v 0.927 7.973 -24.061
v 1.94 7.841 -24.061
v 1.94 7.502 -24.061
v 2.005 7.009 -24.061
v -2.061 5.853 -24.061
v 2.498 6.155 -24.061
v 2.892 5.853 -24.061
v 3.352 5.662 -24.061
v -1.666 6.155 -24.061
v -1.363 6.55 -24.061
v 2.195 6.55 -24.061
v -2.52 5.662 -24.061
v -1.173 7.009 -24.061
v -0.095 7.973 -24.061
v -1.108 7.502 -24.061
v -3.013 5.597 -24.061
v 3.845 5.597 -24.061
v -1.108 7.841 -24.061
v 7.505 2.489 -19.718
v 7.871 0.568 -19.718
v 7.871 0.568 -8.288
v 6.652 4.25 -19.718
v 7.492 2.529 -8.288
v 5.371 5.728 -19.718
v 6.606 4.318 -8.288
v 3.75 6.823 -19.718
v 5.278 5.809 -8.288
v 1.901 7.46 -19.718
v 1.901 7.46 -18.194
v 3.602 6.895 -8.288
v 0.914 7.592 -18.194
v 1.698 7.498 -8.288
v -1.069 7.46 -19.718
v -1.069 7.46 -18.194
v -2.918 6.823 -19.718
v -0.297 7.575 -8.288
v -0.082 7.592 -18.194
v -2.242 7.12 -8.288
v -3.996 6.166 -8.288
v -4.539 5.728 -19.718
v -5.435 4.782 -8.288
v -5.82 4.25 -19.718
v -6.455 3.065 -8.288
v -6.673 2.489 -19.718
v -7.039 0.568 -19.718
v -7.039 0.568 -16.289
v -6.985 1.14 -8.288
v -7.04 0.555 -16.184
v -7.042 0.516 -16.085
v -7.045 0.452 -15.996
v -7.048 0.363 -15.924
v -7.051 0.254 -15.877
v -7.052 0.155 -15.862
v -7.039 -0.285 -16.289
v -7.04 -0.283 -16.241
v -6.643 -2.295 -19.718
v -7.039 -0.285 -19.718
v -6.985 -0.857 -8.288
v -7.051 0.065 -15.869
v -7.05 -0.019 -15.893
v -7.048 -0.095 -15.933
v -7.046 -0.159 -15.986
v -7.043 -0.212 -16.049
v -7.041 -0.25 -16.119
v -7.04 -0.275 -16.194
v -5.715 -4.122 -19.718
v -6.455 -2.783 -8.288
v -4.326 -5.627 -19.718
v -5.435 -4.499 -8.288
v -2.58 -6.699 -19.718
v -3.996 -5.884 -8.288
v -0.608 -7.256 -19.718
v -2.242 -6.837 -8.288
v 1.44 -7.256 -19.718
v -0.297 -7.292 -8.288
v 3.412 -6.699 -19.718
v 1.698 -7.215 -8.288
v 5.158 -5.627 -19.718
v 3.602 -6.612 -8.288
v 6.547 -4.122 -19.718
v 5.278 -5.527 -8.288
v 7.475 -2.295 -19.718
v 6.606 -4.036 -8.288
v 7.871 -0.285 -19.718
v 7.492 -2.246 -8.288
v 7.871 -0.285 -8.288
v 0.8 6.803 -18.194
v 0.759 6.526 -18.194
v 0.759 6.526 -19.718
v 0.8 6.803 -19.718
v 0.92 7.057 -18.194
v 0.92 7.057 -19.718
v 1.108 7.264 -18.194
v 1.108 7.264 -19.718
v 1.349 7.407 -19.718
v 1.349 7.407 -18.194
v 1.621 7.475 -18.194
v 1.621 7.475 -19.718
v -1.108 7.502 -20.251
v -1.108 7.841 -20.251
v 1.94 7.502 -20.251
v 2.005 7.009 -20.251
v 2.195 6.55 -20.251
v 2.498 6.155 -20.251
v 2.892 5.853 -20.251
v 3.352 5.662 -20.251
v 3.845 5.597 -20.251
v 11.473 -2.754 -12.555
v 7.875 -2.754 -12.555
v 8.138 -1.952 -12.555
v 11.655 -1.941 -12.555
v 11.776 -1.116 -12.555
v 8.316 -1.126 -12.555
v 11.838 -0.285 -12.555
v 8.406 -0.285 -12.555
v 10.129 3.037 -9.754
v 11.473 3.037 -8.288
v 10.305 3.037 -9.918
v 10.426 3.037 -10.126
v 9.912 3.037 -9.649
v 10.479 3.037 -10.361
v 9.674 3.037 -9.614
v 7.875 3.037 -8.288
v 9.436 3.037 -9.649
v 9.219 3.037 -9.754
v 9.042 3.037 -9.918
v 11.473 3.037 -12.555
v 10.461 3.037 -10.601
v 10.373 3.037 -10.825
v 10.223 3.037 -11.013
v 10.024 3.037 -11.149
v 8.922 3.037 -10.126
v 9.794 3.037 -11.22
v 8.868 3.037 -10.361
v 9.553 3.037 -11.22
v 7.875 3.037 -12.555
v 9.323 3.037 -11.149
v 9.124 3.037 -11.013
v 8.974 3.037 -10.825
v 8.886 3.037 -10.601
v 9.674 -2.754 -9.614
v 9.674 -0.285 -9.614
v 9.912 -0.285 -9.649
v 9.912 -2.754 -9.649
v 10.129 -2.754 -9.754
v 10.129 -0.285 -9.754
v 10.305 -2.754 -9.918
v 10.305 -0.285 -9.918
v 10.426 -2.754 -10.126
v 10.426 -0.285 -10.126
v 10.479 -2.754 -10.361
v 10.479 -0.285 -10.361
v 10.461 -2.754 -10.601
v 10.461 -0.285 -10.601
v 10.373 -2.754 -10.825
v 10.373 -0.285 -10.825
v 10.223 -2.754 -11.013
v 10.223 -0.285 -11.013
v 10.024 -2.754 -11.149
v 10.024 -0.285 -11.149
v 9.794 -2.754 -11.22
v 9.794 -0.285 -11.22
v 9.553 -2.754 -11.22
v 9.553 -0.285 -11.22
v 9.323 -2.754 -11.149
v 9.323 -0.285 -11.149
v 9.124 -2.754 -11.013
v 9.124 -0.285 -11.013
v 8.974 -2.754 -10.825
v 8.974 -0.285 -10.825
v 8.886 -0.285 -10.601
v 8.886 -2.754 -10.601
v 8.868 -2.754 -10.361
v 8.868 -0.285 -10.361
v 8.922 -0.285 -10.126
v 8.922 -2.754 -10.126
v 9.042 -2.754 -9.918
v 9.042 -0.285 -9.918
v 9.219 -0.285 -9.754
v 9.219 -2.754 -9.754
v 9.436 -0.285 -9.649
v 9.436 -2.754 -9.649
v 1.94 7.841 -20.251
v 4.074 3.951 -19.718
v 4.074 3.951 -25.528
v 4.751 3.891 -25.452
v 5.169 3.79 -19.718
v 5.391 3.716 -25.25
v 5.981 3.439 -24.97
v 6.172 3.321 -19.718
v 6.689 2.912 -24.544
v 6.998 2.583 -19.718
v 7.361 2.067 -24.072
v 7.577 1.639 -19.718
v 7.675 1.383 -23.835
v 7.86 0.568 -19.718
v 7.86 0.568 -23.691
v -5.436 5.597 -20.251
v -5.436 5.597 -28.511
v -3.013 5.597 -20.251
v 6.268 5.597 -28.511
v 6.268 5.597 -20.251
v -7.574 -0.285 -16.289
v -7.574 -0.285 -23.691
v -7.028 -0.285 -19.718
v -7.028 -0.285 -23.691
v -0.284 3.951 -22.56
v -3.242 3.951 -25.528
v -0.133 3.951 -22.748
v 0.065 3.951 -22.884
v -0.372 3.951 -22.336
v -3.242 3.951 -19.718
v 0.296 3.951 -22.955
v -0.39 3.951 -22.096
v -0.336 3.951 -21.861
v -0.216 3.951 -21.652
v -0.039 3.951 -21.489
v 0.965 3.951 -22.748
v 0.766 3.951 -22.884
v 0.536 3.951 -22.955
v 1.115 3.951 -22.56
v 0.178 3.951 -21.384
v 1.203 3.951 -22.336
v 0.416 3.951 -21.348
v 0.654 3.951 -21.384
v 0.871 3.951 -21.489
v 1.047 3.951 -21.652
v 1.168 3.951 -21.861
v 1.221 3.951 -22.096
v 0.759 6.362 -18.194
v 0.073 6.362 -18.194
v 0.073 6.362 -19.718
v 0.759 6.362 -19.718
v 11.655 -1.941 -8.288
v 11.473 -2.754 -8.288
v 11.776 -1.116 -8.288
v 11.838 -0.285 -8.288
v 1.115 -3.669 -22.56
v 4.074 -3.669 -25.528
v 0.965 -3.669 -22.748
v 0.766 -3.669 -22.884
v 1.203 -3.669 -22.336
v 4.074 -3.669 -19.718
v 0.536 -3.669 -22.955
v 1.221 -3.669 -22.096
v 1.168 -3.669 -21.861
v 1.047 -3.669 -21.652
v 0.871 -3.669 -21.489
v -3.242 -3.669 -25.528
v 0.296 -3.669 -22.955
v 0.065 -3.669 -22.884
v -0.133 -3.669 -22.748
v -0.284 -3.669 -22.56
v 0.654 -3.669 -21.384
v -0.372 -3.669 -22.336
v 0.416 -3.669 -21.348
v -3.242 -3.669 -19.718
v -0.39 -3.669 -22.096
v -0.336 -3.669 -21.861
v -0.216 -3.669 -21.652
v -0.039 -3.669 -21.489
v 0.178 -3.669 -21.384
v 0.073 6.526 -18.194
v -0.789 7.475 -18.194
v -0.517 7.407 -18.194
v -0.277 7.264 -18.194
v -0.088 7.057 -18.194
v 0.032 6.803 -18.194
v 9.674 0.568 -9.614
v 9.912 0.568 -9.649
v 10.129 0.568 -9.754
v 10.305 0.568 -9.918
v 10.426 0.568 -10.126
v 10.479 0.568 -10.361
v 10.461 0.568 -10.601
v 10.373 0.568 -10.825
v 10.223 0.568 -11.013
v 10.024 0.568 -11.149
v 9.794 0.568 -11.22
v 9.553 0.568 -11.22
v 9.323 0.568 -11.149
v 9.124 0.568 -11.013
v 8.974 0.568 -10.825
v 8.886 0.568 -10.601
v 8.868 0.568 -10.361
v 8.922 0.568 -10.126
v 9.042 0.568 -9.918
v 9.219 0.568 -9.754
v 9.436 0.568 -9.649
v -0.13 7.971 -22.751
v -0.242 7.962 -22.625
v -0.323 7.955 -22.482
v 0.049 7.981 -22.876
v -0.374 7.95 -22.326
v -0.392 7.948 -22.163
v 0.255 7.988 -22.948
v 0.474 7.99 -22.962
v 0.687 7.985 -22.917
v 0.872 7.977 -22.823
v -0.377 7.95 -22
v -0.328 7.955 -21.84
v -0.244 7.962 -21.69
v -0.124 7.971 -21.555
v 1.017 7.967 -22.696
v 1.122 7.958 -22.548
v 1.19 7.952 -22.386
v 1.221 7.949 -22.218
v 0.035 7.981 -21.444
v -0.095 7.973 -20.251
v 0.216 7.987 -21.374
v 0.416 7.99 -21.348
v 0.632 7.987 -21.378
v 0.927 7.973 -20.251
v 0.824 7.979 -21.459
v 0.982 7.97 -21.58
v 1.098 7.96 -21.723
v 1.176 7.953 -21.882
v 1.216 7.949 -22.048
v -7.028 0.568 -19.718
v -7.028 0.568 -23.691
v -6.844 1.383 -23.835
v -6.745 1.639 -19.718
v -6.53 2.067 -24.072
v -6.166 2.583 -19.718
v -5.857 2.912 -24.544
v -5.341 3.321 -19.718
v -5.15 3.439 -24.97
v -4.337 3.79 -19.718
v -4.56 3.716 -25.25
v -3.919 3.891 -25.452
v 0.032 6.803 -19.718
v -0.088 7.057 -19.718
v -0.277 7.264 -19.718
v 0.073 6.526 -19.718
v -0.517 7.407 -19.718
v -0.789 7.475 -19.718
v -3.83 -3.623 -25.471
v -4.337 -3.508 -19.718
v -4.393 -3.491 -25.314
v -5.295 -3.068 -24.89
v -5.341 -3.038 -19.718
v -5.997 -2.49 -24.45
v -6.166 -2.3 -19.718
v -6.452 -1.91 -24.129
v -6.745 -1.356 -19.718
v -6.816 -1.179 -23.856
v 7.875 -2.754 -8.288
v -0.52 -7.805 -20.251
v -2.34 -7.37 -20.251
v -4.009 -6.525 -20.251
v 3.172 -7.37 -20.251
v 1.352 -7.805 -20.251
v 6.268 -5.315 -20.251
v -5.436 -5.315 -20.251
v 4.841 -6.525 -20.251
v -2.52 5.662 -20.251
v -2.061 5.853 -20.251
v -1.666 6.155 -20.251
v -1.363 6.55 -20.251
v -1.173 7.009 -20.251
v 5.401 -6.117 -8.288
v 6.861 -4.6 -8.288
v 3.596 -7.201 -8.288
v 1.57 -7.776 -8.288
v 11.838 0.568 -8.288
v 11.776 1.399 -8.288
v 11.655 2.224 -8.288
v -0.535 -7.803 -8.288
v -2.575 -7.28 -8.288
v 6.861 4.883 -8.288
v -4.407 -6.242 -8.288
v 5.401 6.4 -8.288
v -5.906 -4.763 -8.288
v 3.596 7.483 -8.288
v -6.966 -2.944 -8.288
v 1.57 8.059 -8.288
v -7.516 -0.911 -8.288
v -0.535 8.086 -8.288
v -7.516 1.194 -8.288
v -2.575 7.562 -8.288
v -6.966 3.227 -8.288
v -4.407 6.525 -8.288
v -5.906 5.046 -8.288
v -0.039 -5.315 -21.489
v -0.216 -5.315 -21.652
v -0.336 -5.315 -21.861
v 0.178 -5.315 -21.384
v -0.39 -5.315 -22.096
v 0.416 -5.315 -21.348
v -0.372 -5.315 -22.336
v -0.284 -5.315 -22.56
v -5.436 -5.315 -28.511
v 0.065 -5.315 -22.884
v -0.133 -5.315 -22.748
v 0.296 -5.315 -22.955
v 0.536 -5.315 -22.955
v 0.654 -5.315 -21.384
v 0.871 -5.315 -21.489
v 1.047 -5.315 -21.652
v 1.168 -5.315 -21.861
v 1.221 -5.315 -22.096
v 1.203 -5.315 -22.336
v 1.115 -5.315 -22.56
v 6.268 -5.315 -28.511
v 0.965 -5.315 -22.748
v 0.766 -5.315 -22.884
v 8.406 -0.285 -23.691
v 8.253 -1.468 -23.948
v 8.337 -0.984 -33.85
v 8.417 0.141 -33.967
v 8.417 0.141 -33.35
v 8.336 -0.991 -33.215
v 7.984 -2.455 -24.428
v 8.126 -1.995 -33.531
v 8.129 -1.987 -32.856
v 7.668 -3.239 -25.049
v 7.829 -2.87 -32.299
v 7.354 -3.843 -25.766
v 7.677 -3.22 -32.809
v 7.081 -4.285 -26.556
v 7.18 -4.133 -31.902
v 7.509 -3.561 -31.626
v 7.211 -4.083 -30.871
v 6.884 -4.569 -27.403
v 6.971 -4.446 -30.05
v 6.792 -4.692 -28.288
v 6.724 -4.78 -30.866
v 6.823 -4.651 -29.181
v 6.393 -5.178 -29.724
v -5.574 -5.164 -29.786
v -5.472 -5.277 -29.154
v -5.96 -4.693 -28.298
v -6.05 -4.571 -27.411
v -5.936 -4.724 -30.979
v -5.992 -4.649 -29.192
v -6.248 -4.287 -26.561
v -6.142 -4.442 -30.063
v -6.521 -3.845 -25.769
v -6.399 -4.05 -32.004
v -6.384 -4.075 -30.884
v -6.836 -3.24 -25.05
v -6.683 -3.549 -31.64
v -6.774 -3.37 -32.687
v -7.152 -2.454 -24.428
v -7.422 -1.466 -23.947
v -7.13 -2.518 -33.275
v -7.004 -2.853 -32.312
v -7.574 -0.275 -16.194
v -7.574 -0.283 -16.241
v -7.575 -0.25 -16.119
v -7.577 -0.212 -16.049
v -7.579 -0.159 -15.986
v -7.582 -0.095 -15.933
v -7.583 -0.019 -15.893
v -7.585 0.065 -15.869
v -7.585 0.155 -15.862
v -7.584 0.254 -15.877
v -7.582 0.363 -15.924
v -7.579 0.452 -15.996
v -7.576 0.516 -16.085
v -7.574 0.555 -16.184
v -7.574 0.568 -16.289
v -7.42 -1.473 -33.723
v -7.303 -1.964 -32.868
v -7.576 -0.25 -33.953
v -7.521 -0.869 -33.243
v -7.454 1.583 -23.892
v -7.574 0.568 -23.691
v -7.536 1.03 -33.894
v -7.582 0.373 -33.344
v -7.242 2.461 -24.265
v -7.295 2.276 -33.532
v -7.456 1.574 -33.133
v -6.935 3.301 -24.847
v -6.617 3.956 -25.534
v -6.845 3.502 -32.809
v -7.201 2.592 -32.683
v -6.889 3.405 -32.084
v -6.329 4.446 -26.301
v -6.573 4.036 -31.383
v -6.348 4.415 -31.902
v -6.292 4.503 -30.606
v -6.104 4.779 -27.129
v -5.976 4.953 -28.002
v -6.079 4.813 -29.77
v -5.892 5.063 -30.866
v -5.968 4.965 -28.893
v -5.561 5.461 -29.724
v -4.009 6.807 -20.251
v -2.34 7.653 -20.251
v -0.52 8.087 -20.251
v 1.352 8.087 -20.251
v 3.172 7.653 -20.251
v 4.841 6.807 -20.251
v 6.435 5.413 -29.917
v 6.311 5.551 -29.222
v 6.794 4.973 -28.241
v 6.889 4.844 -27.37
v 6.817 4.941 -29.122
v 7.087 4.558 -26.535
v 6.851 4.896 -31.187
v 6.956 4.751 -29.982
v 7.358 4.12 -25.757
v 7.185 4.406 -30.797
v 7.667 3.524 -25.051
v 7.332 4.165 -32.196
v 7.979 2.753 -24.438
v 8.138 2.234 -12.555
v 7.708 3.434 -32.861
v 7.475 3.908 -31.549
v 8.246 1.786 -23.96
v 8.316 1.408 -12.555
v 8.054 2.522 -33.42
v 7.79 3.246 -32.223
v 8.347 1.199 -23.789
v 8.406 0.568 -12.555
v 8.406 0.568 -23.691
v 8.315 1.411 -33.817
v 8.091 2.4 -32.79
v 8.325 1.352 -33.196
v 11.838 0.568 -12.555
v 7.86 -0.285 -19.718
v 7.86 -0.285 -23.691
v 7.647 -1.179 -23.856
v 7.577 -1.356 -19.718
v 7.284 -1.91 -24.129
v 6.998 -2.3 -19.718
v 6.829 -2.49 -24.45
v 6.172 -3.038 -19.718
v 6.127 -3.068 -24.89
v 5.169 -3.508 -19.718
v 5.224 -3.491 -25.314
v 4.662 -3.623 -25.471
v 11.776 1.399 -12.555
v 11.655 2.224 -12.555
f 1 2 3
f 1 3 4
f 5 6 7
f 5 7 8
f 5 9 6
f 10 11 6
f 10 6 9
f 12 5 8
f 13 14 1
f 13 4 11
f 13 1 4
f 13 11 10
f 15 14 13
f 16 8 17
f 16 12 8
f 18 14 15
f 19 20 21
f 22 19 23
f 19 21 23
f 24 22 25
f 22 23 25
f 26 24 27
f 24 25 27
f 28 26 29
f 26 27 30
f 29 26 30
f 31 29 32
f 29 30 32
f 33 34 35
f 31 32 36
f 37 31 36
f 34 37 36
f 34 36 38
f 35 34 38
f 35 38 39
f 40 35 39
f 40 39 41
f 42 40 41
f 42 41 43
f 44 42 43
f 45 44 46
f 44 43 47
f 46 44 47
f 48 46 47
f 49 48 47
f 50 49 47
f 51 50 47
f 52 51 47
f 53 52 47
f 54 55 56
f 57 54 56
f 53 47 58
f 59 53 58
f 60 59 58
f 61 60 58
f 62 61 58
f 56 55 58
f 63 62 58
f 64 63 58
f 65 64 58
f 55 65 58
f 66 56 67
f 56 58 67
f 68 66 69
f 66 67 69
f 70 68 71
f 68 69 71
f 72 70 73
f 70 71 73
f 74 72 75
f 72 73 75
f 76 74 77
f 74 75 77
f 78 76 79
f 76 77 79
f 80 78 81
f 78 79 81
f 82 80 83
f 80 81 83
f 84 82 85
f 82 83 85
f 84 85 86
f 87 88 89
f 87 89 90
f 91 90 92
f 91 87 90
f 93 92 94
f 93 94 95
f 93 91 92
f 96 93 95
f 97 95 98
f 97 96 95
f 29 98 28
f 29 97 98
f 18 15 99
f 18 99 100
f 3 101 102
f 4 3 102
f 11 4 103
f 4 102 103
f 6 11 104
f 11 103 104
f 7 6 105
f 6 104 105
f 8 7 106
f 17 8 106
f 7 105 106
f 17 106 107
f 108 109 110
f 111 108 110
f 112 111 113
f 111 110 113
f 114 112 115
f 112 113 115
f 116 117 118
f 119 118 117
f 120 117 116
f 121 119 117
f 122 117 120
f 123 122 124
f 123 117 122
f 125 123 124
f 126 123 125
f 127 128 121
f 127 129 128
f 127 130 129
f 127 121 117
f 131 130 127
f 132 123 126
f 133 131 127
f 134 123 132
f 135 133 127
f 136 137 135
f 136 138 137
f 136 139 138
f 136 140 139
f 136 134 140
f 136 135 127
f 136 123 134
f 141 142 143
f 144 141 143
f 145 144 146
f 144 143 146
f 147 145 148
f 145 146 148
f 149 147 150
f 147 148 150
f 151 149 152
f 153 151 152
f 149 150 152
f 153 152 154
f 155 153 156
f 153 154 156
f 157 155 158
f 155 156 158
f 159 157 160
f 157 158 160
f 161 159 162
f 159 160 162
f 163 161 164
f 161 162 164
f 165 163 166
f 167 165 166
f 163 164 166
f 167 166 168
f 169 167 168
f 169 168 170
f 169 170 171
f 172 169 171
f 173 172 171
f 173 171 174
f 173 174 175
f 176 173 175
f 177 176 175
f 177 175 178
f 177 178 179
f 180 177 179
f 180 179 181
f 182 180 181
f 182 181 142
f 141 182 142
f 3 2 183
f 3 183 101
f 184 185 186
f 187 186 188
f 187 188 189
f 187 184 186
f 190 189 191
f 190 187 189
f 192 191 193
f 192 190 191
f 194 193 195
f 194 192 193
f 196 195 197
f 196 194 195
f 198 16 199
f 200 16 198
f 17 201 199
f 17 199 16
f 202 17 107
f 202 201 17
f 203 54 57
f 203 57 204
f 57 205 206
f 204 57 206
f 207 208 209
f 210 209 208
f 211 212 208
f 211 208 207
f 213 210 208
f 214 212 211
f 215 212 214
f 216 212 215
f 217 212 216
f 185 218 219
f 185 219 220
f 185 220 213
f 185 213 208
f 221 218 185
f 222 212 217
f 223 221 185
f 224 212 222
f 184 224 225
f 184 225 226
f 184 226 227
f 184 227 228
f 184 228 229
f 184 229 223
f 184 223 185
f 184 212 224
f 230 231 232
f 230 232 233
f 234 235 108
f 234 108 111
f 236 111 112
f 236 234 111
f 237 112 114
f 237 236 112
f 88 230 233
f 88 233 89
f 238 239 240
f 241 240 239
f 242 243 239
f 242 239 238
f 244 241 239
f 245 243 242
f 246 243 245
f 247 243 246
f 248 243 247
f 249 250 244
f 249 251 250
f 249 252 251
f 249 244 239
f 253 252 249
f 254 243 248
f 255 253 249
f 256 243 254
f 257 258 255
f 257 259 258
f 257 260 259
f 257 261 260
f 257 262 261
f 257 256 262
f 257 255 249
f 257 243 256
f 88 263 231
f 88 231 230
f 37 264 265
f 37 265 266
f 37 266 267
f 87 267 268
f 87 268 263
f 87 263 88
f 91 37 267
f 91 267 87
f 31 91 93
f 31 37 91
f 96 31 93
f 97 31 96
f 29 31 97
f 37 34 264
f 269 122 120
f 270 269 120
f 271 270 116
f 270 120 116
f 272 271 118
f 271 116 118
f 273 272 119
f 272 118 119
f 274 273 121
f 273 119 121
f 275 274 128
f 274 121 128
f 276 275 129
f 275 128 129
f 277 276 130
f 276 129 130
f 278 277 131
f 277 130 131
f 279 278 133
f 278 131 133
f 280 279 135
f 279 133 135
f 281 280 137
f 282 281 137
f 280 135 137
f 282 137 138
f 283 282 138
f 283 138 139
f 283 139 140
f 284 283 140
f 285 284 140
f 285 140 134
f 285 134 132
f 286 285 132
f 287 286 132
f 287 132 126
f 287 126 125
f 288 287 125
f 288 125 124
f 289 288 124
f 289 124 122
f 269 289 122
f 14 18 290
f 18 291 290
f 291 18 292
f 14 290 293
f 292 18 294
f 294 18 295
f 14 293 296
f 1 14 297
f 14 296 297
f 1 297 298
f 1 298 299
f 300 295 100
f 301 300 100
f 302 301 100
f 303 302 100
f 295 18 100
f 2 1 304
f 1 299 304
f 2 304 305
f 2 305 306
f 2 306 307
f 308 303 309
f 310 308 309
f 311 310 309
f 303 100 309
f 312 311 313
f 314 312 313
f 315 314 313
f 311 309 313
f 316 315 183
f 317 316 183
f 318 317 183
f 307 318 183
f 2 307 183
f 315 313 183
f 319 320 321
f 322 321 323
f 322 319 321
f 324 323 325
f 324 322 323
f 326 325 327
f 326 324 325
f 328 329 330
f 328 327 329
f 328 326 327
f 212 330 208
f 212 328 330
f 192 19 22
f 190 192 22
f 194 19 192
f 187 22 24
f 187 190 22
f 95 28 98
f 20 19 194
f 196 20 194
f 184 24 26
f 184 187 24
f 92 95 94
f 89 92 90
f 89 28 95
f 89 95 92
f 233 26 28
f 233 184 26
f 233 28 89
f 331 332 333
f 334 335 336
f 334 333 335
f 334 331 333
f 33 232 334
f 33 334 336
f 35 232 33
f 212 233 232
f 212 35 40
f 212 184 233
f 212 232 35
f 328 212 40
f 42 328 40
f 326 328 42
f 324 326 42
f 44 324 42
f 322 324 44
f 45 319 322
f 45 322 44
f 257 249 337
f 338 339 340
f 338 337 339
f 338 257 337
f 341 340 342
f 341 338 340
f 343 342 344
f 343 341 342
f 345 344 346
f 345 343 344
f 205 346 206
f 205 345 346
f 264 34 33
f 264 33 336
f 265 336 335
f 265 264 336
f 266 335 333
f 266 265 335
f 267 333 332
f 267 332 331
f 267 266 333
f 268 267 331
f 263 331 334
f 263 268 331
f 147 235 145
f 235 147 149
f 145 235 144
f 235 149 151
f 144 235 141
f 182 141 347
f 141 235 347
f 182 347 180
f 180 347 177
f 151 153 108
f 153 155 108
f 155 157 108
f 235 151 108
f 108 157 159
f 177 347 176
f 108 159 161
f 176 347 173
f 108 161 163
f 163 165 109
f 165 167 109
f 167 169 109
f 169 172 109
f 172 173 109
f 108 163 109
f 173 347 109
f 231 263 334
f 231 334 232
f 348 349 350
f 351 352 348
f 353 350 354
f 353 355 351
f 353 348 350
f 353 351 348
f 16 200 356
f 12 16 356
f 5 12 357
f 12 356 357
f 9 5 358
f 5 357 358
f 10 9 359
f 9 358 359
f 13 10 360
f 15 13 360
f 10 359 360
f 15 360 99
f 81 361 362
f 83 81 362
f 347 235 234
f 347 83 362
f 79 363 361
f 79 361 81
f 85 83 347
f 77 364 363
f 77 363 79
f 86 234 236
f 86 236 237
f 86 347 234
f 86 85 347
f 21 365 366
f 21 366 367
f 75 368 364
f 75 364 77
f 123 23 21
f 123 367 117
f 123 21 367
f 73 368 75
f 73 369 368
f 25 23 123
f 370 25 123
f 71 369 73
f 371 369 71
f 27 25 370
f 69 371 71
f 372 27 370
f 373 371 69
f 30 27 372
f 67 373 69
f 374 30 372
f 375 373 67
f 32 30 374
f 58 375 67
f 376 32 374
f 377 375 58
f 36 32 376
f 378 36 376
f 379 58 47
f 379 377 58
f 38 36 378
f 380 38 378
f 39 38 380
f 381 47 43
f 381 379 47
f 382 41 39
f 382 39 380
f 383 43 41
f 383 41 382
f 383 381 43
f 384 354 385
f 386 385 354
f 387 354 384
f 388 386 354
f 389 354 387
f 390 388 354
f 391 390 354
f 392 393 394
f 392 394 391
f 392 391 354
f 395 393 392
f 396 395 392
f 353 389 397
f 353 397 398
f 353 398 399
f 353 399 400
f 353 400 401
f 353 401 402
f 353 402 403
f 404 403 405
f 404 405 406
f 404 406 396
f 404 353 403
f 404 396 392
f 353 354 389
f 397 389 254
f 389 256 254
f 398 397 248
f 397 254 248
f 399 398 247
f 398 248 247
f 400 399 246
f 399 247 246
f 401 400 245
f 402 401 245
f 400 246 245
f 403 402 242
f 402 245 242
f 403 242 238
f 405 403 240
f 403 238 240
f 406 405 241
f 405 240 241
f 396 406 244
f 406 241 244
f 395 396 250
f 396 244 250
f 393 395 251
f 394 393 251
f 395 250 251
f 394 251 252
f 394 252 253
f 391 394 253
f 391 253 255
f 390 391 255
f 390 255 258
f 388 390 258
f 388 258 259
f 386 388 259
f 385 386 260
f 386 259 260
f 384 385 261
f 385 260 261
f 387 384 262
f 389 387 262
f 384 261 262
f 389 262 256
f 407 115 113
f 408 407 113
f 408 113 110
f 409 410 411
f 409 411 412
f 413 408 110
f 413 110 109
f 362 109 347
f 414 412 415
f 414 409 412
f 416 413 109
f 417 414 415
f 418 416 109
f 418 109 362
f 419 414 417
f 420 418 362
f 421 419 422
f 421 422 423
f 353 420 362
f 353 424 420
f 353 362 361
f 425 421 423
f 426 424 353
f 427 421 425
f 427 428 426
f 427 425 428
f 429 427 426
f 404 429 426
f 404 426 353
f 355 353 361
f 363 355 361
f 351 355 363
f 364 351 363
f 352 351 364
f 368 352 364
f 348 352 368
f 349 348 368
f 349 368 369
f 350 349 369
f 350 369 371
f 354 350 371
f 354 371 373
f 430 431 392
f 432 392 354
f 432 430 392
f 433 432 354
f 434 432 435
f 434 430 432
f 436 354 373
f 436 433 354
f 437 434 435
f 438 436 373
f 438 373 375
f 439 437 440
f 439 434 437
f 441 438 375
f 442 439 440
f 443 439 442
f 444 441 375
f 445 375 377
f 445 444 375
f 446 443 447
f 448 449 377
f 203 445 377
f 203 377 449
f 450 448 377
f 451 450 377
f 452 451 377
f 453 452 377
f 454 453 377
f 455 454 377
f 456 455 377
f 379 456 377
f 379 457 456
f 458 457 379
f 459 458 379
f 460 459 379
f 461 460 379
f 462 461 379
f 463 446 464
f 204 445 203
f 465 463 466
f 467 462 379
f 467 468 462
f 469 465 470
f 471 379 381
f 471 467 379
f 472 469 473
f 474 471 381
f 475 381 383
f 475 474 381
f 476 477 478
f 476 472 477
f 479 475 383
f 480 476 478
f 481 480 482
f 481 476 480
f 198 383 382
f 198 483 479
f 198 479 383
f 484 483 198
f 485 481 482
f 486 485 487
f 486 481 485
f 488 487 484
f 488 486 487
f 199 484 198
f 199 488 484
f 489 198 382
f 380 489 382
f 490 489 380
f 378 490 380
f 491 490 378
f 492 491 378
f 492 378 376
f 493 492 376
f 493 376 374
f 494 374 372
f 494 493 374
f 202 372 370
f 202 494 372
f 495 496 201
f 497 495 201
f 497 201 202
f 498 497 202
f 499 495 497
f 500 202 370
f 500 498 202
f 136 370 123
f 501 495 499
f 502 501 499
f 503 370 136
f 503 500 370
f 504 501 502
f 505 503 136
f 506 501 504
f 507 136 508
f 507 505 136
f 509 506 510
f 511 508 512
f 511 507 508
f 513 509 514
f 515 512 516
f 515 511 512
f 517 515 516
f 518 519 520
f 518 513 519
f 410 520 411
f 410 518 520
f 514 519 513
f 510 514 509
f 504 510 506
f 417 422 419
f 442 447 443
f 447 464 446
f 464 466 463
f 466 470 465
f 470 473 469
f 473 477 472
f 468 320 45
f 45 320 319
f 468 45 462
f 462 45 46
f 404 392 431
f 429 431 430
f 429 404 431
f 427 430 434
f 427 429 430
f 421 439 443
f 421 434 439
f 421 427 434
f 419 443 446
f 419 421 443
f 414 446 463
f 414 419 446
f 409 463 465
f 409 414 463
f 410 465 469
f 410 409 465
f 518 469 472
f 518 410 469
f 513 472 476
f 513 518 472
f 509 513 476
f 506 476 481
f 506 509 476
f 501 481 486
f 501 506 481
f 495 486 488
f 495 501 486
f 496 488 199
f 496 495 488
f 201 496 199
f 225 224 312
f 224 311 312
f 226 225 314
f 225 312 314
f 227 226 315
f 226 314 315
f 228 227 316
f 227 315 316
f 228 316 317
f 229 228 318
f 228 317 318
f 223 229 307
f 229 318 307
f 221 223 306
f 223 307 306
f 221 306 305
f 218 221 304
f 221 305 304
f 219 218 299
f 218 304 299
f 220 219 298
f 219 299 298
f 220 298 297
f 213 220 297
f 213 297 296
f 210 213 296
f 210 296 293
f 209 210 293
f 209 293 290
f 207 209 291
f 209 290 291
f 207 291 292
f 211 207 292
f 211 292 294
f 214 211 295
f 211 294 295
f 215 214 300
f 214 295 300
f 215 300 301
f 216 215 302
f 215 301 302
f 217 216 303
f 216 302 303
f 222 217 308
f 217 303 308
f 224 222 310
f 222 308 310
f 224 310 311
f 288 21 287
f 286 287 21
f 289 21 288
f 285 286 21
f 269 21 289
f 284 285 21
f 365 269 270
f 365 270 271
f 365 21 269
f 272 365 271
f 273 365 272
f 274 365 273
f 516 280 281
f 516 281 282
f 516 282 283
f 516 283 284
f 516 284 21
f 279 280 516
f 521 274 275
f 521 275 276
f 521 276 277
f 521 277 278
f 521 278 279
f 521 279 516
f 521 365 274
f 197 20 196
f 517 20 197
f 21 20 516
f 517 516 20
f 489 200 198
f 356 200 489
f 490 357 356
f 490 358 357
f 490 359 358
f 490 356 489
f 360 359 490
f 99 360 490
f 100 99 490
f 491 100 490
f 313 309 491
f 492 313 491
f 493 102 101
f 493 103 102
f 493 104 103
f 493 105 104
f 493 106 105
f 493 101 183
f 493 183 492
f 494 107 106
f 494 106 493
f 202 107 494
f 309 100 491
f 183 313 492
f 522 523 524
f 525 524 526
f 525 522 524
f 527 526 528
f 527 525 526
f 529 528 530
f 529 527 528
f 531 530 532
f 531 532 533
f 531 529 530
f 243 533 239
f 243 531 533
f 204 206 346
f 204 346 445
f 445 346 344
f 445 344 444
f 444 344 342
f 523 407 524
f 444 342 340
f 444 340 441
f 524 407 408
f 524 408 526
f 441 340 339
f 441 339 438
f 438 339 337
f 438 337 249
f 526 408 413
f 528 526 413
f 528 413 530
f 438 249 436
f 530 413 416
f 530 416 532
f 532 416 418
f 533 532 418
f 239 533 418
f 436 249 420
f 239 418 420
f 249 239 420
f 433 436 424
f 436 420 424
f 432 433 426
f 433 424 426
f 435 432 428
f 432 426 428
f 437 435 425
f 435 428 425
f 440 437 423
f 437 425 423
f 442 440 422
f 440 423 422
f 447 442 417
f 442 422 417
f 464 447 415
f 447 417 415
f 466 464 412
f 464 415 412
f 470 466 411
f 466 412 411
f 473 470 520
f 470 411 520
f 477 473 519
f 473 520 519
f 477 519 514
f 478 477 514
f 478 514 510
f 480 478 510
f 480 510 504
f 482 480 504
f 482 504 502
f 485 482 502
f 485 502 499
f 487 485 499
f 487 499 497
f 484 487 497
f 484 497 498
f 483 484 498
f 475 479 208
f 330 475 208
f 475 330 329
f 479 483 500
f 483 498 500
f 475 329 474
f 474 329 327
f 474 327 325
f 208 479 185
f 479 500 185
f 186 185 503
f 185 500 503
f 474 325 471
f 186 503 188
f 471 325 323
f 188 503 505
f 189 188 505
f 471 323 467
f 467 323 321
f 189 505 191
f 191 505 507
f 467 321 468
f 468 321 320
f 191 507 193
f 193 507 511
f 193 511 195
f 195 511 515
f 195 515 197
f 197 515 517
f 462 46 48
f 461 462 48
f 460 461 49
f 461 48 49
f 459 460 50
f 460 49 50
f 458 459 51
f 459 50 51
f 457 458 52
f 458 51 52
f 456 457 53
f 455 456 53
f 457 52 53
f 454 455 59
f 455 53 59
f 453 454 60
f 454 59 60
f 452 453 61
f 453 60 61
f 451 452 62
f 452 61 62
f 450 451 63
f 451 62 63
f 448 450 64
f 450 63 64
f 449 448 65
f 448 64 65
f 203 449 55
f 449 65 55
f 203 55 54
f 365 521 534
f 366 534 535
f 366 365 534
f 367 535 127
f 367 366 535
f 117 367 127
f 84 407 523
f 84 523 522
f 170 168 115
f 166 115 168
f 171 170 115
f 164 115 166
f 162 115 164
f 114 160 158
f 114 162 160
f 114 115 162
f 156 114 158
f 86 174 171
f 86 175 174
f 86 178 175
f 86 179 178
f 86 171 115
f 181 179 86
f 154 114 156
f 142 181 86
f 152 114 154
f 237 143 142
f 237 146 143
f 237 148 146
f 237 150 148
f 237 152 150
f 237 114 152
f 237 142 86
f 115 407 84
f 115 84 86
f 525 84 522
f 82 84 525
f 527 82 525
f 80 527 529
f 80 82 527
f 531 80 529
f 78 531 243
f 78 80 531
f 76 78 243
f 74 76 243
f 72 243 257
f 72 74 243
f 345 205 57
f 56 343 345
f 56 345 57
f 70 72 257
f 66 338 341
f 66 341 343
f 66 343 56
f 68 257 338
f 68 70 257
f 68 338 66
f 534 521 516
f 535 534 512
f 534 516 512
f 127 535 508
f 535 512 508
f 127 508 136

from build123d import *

# Parameters (mm, degrees)
SKETCH3_R           = 8.0645
CUT_EXTRUDE1_DEPTH  = 15.24
CUT_EXTRUDE2_DEPTH  = 15.24
CUT_EXTRUDE3_DEPTH  = 12.7
BOSS_EXTRUDE1_DEPTH = 6.35
SKETCH8_R           = 1.3462
CUT_EXTRUDE4_DEPTH  = 14.605
CUT_EXTRUDE5_DEPTH  = 29.21
SKETCH10_W          = 7.112
SKETCH10_H          = 9.652
BOSS_EXTRUDE2_DEPTH = 19.05
SKETCH11_R          = 12.446
CUT_EXTRUDE6_DEPTH  = 13.97
CUT_EXTRUDE8_DEPTH  = 13.97
SKETCH14_R          = 1.3462
CUT_EXTRUDE9_DEPTH  = 13.97
CUT_EXTRUDE10_START = 21.59
CUT_EXTRUDE10_DEPTH = 21.59
BOSS_EXTRUDE3_START = 2.54
BOSS_EXTRUDE3_DEPTH = 2.54
SCALE1_SCALE        = 0.6


with BuildPart() as part:
    # Sketch1 → Revolve1 (revolve)
    with BuildSketch(Plane(origin=(0, 0, 0), x_dir=(0, 0, -1), z_dir=(1, 0, 0)), mode=Mode.PRIVATE) as revolve1_sk:
        Polygon((0, 12.446), (0, 13.335), (42.799, 13.335), (42.799, 0), (19.05, 0), (19.05, 12.446), align=None)
    revolve(revolve1_sk.sketch.rotate(Axis((0, 0, 0), (0, 0, -1)), 90), axis=Axis((0, 0, 0), (0, 0, -1)))

    # Sketch3 → Cut-Extrude1 (cut, symmetric)
    with BuildSketch(Plane(origin=(0, 0, 0), x_dir=(0, 0, -1), z_dir=(1, 0, 0))):
        with Locations((33.7058, 0)):
            Circle(SKETCH3_R)
    extrude(amount=CUT_EXTRUDE1_DEPTH, both=True, mode=Mode.SUBTRACT)

    # Sketch5 → Cut-Extrude2 (cut, symmetric)
    with BuildSketch(Plane(origin=(0, 0, 0), x_dir=(0, 0, -1), z_dir=(1, 0, 0))):
        with BuildLine():
            Line((33.7058, 9.0932), (19.939, 9.0932))
            Line((19.939, 9.0932), (19.939, 13.335))
            Line((19.939, 13.335), (43.742849638, 13.335))
            Line((43.742849638, 13.335), (43.742849638, -13.335))
            Line((43.742849638, -13.335), (19.939, -13.335))
            Line((19.939, -13.335), (19.939, -9.0932))
            Line((19.939, -9.0932), (33.7058, -9.0932))
            ThreePointArc((33.7058, -9.0932), (42.799, 0), (33.7058, 9.0932))
        make_face()
    extrude(amount=CUT_EXTRUDE2_DEPTH, both=True, mode=Mode.SUBTRACT)

    # Sketch6 → Cut-Extrude3 (cut)
    with BuildSketch(Plane.XY.offset(-19.05)):
        with BuildLine():
            Line((-6.096, 6.35), (6.096, 6.35))
            ThreePointArc((6.096, 6.35), (12.446, 0), (6.096, -6.35))
            Line((6.096, -6.35), (-6.096, -6.35))
            ThreePointArc((-6.096, -6.35), (-12.446, 0), (-6.096, 6.35))
        make_face()
    extrude(amount=-CUT_EXTRUDE3_DEPTH, mode=Mode.SUBTRACT)

    # Sketch7 → Boss-Extrude1 (add)
    with BuildSketch(Plane(origin=(0, 0, -19.939), x_dir=(-1, 0, 0), z_dir=(0, 0, -1))):
        with BuildLine():
            Line((-5.715, 9.0932), (5.715, 9.0932))
            ThreePointArc((5.715, 9.0932), (3.46993597, 10.02313597), (2.54, 12.2682))
            Line((2.54, 12.2682), (2.54, 12.832028717))
            ThreePointArc((2.54, 12.832028717), (0, 13.081), (-2.54, 12.832028717))
            Line((-2.54, 12.832028717), (-2.54, 12.2682))
            ThreePointArc((-2.54, 12.2682), (-3.46993597, 10.02313597), (-5.715, 9.0932))
        make_face()
    extrude(amount=BOSS_EXTRUDE1_DEPTH)

    # Sketch8 → Cut-Extrude4 (cut, symmetric)
    with BuildSketch(Plane(origin=(0, 0, 0), x_dir=(1, 0, 0), z_dir=(0, 1, 0))):
        with Locations(Location((0, 23.114, 0), (0, 0, 270))):
            Circle(SKETCH8_R)
    extrude(amount=CUT_EXTRUDE4_DEPTH, both=True, mode=Mode.SUBTRACT)

    # Sketch9 → Cut-Extrude5 (cut)
    with BuildSketch(Plane(origin=(0, 0, 0), x_dir=(0, 0, -1), z_dir=(1, 0, 0))):
        with BuildLine():
            Line((28.696128941, 0.7112), (13.335, 0.7112))
            ThreePointArc((13.335, 0.7112), (12.6238, 0), (13.335, -0.7112))
            Line((13.335, -0.7112), (28.696128941, -0.7112))
            Line((28.696128941, -0.7112), (28.696128941, 0.7112))
        make_face()
    extrude(amount=-CUT_EXTRUDE5_DEPTH, mode=Mode.SUBTRACT)

    # Sketch10 → Boss-Extrude2 (add)
    with BuildSketch(Plane(origin=(0, 0, 0), x_dir=(0, 0, -1), z_dir=(1, 0, 0))):
        with Locations((3.556, 0)):
            Rectangle(SKETCH10_W, SKETCH10_H)
    extrude(amount=BOSS_EXTRUDE2_DEPTH)

    # Sketch11 → Cut-Extrude6 (cut)
    with BuildSketch(Plane.XY):
        Circle(SKETCH11_R)
    extrude(amount=-CUT_EXTRUDE6_DEPTH, mode=Mode.SUBTRACT)

    # Sketch13 → Cut-Extrude8 (cut)
    with BuildSketch(Plane.XY):
        with BuildLine():
            Line((19.689857662, 4.826), (19.689857662, -4.826))
            Line((19.689857662, -4.826), (18.428570862, -4.826))
            ThreePointArc((18.428570862, -4.826), (19.05, 0), (18.428570862, 4.826))
            Line((18.428570862, 4.826), (19.689857662, 4.826))
        make_face()
    extrude(amount=-CUT_EXTRUDE8_DEPTH, mode=Mode.SUBTRACT)

    # Sketch14 → Cut-Extrude9 (cut)
    with BuildSketch(Plane(origin=(0, 4.826, 0), x_dir=(1, 0, 0), z_dir=(0, 1, 0))):
        with Locations(Location((15.429829434, 3.556, 0), (0, 0, 270))):
            Circle(SKETCH14_R)
    extrude(amount=-CUT_EXTRUDE9_DEPTH, mode=Mode.SUBTRACT)

    # Sketch15 → Cut-Extrude10 (cut)
    with BuildSketch(Plane(origin=(0, 0, 0), x_dir=(0, 0, -1), z_dir=(1, 0, 0)).offset(CUT_EXTRUDE10_START)):
        with BuildLine():
            Line((0, 0.7112), (25.672721212, 0.7112))
            ThreePointArc((25.672721212, 0.7112), (25.6413, 0), (25.672721212, -0.7112))
            Line((25.672721212, -0.7112), (0, -0.7112))
            Line((0, -0.7112), (0, 0.7112))
        make_face()
    extrude(amount=-CUT_EXTRUDE10_DEPTH, mode=Mode.SUBTRACT)

    # Sketch16 → Boss-Extrude3 (add)
    with BuildSketch(Plane.XY.offset(-19.05).offset(BOSS_EXTRUDE3_START)):
        with BuildLine():
            Line((-0.5715, 10.641698231), (-0.5715, 10.367746169))
            Line((-0.5715, 10.367746169), (0.5715, 10.367746169))
            Line((0.5715, 10.367746169), (0.5715, 10.641698231))
            ThreePointArc((0.5715, 10.641698231), (1.154243176, 11.870771042), (2.474643275, 12.197502066))
            ThreePointArc((2.474643275, 12.197502066), (0, 12.446), (-2.474643275, 12.197502066))
            ThreePointArc((-2.474643275, 12.197502066), (-1.154243176, 11.870771042), (-0.5715, 10.641698231))
        make_face()
    extrude(amount=-BOSS_EXTRUDE3_DEPTH)


with BuildPart() as part_1:
    # Scale1: scaled about (1.039780089, 0.353442255, -20.719141089)
    add(part.part.scale(SCALE1_SCALE).moved(Location((0.415912036, 0.141376902, -8.287656436))))


solid = part_1.part
